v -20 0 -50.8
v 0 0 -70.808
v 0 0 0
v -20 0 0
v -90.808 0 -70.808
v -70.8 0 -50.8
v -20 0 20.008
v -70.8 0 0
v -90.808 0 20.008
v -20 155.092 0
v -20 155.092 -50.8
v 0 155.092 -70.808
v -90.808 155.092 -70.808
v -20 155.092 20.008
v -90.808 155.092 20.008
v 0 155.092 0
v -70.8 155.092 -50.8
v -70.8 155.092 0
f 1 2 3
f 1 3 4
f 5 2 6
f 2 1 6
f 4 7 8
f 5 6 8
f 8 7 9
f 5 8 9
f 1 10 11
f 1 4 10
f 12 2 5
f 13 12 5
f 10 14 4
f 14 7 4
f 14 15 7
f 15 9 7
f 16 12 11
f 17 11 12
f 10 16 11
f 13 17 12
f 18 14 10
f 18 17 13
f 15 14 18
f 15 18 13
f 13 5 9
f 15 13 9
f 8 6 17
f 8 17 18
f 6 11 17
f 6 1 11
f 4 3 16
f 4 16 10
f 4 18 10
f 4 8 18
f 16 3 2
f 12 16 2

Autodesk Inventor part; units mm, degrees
ref_plane "YZ Plane" through (0, 0, 0) normal (1, 0, 0) x (0, 1, 0)
ref_plane "XZ Plane" through (0, 0, 0) normal (0, 1, 0) x (-1, 0, 0)
ref_plane "XY Plane" through (0, 0, 0) normal (0, 0, 1) x (1, 0, 0)
sketch "Sketch1" plane through (0, 0, 0) normal (0, 1, 0) x (-1, 0, 0)
  line L0 (0, 0) -> (20, 0)
  line L1 (20, 0) -> (20, -50.8)
  line L2 (20, -50.8) -> (70.8, -50.8)
  line L3 (70.8, -50.8) -> (70.8, 0)
  line L4 (70.8, 0) -> (20, 0)
  line L5 (0, 0) -> (0, -70.808)
  line L6 (0, -70.808) -> (90.808, -70.808)
  line L7 (90.808, -70.808) -> (90.808, 20.008)
  line L8 (90.808, 20.008) -> (20, 20.008)
  line L9 (20, 20.008) -> (20, 0)
  dimension "d0" = 20
  dimension "d1" = 50.8
  dimension "d2" = 50.8
  dimension "d3" = 50.8
  dimension "d4" = 50.8
  dimension "d6" = 28.2899
  dimension "d7" = 28.2956
  dimension "d8" = 28.2956
  dimension "d11" = 20.008
extrude "Extrusion1" add sketch "Sketch1" along normal blind 155.0924
properties part number "LegHolder" material "Wood (Birch)"
